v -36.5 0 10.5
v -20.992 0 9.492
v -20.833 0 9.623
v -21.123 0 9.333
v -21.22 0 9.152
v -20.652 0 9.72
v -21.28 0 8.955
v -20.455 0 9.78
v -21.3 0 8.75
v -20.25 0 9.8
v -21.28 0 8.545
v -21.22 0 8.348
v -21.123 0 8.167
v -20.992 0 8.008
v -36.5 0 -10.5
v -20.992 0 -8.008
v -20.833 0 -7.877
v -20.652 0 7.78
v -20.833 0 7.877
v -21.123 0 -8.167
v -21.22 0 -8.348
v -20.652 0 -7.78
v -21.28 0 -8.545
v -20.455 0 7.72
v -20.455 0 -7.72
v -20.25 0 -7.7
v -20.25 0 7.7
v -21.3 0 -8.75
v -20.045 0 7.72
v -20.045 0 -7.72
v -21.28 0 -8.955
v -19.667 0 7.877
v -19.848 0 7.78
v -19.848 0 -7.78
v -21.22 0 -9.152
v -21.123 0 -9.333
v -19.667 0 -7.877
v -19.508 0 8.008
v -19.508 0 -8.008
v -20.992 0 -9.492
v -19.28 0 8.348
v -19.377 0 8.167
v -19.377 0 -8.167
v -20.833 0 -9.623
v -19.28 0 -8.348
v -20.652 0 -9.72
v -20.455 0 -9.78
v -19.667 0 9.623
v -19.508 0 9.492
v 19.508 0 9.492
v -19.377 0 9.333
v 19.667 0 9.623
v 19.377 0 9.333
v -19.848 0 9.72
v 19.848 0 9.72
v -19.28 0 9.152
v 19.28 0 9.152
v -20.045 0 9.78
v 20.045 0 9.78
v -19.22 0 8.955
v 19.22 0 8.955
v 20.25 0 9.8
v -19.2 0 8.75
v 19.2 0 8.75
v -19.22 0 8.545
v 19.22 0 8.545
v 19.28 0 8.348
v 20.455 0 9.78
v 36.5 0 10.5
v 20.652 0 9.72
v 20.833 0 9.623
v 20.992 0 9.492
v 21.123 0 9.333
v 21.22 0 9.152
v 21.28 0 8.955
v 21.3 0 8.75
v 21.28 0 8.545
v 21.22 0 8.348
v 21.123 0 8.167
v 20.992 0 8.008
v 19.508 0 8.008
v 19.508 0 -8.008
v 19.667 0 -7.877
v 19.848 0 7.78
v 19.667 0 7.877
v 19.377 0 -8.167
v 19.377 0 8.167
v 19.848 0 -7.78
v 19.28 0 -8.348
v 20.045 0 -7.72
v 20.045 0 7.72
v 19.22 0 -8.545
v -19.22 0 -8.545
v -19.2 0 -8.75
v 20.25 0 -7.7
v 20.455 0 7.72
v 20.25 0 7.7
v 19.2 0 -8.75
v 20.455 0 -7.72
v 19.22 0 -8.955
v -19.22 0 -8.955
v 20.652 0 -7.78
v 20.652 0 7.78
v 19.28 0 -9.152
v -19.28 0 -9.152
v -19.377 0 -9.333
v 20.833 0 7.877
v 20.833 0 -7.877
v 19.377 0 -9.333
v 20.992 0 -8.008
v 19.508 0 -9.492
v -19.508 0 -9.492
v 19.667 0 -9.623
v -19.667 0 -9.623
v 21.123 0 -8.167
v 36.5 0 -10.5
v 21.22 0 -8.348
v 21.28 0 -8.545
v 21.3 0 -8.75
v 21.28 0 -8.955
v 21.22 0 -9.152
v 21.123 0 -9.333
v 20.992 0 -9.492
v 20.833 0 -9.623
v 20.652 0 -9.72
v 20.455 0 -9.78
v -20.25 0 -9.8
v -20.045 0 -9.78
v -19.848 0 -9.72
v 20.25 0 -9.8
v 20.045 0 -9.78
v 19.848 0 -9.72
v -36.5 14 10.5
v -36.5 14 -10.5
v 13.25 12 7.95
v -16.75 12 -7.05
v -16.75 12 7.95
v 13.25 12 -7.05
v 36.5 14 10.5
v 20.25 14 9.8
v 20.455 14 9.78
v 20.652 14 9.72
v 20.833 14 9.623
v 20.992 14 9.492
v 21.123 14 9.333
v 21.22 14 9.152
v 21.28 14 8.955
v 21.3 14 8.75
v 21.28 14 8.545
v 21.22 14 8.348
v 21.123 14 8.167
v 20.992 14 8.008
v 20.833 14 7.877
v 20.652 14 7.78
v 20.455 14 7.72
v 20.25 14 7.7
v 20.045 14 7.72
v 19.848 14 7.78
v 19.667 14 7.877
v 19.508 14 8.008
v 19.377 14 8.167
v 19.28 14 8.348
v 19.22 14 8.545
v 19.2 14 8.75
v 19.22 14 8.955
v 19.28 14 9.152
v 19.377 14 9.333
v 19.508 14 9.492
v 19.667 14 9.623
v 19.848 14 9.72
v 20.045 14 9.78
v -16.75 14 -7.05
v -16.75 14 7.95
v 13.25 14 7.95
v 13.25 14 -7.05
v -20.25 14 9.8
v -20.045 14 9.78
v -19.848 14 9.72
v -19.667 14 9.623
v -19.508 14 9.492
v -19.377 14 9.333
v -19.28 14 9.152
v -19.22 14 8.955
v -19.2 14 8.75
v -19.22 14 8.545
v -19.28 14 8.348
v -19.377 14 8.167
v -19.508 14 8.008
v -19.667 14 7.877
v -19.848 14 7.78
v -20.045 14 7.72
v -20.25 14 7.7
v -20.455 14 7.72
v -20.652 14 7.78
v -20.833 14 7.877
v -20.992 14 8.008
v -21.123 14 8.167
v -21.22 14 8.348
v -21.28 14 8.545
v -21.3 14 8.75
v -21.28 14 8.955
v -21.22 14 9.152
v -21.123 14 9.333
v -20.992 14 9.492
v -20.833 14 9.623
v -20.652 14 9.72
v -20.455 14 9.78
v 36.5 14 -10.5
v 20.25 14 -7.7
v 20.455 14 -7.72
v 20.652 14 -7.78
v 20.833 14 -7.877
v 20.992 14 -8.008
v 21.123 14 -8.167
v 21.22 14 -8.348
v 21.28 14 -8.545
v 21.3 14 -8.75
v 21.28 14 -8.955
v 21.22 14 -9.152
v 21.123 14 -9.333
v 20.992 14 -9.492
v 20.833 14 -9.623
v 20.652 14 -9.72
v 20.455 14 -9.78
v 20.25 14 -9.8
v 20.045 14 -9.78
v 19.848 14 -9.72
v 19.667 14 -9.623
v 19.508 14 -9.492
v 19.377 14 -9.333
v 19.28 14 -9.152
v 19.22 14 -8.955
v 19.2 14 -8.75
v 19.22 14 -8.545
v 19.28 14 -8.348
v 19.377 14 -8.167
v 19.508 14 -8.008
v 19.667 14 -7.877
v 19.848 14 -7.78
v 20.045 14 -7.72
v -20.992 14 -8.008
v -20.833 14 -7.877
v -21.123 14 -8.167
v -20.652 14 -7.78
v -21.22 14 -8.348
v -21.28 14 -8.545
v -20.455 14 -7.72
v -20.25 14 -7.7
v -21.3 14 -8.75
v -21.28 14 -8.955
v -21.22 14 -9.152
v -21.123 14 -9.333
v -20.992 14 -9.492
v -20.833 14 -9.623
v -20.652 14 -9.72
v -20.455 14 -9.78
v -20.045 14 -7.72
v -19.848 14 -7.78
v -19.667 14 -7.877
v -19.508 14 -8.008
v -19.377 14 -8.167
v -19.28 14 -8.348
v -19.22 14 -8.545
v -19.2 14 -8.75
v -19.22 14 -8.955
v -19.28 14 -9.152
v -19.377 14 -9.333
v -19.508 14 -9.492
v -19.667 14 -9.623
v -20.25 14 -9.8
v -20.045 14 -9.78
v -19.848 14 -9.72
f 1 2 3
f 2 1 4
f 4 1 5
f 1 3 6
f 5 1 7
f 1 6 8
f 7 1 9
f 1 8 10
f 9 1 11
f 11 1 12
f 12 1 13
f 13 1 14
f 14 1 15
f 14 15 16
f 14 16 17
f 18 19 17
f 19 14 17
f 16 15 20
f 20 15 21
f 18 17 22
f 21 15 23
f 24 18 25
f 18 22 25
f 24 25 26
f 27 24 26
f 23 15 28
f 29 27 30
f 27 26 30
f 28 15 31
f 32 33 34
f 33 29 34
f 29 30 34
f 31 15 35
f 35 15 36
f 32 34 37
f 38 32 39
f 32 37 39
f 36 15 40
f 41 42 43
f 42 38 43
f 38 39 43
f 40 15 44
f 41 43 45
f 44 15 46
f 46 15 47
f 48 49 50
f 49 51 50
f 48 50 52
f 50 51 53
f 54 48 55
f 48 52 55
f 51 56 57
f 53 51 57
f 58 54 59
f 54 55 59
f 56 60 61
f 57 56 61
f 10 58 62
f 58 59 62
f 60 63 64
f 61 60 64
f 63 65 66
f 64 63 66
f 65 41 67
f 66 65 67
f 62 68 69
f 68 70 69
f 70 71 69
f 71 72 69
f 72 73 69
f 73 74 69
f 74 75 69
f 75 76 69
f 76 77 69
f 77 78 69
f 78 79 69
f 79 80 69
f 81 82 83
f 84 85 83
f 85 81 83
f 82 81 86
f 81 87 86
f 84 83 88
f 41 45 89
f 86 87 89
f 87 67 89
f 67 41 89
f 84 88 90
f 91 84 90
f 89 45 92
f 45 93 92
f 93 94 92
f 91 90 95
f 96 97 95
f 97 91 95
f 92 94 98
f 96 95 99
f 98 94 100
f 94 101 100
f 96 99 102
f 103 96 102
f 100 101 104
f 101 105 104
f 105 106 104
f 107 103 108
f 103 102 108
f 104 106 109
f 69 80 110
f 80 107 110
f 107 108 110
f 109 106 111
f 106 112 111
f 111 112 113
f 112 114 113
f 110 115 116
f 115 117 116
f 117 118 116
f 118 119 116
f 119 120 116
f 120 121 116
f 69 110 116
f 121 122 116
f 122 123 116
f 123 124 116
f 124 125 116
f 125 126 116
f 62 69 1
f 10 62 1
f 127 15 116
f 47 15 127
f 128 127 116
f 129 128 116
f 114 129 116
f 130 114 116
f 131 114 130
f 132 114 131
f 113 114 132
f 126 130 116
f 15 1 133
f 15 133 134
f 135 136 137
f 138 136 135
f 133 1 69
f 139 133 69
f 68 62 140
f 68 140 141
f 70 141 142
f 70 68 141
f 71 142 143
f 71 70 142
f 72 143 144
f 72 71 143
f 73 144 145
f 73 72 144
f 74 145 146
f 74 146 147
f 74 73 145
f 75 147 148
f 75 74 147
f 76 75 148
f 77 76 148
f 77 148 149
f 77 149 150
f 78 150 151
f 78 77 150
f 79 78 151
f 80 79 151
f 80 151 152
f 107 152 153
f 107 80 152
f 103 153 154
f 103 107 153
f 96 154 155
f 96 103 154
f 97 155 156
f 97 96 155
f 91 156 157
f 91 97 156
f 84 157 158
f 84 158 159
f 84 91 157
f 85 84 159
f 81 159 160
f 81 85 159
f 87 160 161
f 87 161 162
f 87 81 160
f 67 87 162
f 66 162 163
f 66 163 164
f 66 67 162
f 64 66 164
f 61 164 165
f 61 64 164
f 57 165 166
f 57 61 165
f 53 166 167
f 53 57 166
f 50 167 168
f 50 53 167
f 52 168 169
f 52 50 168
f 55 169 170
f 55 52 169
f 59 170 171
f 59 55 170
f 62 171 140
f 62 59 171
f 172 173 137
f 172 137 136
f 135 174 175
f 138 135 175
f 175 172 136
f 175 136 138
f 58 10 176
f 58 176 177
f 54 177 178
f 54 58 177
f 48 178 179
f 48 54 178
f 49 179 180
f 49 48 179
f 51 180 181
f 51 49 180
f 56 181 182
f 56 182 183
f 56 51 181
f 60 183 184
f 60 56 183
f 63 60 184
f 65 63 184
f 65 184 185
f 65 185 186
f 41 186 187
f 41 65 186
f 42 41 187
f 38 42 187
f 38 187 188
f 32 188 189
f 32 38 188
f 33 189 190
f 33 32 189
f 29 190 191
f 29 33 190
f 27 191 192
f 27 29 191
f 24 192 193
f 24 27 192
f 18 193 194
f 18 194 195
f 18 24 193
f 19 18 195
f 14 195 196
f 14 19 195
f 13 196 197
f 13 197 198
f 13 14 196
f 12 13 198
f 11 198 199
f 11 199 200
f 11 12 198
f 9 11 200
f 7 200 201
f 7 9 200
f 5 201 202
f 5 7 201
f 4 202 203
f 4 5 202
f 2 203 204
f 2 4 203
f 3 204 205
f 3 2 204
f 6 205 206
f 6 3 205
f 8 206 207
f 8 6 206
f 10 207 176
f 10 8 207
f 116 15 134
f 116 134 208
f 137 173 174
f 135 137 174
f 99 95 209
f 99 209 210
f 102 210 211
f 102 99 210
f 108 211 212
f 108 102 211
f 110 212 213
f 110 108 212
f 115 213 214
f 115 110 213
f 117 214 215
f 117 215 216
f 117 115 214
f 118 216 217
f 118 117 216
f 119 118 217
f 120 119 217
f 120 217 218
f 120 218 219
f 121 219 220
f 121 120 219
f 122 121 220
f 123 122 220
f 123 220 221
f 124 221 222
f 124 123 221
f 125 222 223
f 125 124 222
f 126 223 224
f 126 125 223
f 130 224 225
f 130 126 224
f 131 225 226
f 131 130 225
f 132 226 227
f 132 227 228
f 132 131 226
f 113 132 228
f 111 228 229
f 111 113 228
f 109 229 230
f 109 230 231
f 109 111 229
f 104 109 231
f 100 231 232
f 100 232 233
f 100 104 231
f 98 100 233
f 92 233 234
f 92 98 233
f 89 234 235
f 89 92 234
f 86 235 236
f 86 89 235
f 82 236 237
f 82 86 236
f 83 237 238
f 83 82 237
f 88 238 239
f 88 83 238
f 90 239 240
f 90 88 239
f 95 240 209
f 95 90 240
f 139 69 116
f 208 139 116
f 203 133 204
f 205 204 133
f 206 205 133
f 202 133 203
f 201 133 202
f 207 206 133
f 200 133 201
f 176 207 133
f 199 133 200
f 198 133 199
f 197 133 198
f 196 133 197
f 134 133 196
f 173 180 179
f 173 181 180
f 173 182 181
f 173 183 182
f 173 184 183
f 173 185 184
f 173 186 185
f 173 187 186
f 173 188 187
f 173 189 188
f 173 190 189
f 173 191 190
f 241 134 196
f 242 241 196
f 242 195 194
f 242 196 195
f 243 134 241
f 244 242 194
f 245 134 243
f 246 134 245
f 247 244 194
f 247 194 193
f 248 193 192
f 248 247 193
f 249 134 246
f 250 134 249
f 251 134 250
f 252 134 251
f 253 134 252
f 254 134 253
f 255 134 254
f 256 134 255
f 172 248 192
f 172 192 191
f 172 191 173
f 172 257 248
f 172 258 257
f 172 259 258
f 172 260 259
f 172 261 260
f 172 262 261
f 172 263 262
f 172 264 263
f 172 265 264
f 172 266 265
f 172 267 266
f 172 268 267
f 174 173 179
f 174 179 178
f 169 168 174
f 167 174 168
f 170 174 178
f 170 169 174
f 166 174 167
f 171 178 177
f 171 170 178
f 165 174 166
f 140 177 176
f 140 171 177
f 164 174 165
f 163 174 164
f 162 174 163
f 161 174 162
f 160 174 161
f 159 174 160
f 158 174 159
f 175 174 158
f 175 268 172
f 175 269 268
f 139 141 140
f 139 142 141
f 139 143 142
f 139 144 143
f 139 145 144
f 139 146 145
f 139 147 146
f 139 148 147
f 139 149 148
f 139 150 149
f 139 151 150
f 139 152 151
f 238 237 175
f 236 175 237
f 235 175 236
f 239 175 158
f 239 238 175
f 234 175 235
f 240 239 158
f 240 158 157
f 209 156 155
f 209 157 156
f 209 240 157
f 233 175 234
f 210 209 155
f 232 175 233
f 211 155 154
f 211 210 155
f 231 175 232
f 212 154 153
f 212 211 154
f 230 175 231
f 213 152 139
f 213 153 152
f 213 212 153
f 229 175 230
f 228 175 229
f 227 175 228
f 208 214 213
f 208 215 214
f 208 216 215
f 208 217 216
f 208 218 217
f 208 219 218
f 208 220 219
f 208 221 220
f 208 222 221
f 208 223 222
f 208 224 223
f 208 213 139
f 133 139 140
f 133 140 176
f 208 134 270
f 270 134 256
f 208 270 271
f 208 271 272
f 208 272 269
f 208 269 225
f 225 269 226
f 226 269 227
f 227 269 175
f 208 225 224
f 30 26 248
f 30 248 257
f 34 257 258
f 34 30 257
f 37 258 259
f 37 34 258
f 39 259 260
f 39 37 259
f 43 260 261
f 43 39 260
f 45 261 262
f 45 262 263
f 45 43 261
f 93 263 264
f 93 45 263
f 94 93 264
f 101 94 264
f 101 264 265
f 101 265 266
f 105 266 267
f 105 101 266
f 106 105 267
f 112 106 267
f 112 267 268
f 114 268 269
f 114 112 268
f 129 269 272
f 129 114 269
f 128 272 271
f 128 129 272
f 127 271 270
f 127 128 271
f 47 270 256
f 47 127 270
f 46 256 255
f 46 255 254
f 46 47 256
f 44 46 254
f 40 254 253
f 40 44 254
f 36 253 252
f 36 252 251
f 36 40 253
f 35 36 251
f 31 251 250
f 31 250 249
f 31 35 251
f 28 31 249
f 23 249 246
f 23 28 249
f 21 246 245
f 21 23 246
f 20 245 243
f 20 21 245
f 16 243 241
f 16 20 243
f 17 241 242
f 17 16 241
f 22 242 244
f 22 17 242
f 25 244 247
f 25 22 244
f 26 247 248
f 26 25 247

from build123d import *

# Parameters (mm, degrees)
SKETCH_1_W          = 73
SKETCH_1_H          = 21
SKETCH_1_R          = 1.05
EXTRUDE_1_DEPTH     = 14
SKETCH_2_W          = 30
SKETCH_2_H          = 15
CUT_EXTRUDE_1_DEPTH = 2


with BuildPart() as part:
    # 草图1 → 凸台-拉伸1 (new body)
    with BuildSketch(Plane(origin=(0, 0, 0), x_dir=(1, 0, 0), z_dir=(0, 1, 0))):
        Rectangle(SKETCH_1_W, SKETCH_1_H)
        with Locations(Location((-20.25, 8.75, 0), (0, 0, 270))):
            Circle(SKETCH_1_R, mode=Mode.SUBTRACT)
        with Locations(Location((20.25, 8.75, 0), (0, 0, 270))):
            Circle(SKETCH_1_R, mode=Mode.SUBTRACT)
        with Locations(Location((20.25, -8.75, 0), (0, 0, 270))):
            Circle(SKETCH_1_R, mode=Mode.SUBTRACT)
        with Locations(Location((-20.25, -8.75, 0), (0, 0, 270))):
            Circle(SKETCH_1_R, mode=Mode.SUBTRACT)
    extrude(amount=EXTRUDE_1_DEPTH)

    # 草图2 → 切除-拉伸1 (cut)
    with BuildSketch(Plane(origin=(0, 14, 0), x_dir=(1, 0, 0), z_dir=(0, 1, 0))):
        with Locations((-1.75, -0.45)):
            Rectangle(SKETCH_2_W, SKETCH_2_H)
    extrude(amount=-CUT_EXTRUDE_1_DEPTH, mode=Mode.SUBTRACT)


solid = part.part
